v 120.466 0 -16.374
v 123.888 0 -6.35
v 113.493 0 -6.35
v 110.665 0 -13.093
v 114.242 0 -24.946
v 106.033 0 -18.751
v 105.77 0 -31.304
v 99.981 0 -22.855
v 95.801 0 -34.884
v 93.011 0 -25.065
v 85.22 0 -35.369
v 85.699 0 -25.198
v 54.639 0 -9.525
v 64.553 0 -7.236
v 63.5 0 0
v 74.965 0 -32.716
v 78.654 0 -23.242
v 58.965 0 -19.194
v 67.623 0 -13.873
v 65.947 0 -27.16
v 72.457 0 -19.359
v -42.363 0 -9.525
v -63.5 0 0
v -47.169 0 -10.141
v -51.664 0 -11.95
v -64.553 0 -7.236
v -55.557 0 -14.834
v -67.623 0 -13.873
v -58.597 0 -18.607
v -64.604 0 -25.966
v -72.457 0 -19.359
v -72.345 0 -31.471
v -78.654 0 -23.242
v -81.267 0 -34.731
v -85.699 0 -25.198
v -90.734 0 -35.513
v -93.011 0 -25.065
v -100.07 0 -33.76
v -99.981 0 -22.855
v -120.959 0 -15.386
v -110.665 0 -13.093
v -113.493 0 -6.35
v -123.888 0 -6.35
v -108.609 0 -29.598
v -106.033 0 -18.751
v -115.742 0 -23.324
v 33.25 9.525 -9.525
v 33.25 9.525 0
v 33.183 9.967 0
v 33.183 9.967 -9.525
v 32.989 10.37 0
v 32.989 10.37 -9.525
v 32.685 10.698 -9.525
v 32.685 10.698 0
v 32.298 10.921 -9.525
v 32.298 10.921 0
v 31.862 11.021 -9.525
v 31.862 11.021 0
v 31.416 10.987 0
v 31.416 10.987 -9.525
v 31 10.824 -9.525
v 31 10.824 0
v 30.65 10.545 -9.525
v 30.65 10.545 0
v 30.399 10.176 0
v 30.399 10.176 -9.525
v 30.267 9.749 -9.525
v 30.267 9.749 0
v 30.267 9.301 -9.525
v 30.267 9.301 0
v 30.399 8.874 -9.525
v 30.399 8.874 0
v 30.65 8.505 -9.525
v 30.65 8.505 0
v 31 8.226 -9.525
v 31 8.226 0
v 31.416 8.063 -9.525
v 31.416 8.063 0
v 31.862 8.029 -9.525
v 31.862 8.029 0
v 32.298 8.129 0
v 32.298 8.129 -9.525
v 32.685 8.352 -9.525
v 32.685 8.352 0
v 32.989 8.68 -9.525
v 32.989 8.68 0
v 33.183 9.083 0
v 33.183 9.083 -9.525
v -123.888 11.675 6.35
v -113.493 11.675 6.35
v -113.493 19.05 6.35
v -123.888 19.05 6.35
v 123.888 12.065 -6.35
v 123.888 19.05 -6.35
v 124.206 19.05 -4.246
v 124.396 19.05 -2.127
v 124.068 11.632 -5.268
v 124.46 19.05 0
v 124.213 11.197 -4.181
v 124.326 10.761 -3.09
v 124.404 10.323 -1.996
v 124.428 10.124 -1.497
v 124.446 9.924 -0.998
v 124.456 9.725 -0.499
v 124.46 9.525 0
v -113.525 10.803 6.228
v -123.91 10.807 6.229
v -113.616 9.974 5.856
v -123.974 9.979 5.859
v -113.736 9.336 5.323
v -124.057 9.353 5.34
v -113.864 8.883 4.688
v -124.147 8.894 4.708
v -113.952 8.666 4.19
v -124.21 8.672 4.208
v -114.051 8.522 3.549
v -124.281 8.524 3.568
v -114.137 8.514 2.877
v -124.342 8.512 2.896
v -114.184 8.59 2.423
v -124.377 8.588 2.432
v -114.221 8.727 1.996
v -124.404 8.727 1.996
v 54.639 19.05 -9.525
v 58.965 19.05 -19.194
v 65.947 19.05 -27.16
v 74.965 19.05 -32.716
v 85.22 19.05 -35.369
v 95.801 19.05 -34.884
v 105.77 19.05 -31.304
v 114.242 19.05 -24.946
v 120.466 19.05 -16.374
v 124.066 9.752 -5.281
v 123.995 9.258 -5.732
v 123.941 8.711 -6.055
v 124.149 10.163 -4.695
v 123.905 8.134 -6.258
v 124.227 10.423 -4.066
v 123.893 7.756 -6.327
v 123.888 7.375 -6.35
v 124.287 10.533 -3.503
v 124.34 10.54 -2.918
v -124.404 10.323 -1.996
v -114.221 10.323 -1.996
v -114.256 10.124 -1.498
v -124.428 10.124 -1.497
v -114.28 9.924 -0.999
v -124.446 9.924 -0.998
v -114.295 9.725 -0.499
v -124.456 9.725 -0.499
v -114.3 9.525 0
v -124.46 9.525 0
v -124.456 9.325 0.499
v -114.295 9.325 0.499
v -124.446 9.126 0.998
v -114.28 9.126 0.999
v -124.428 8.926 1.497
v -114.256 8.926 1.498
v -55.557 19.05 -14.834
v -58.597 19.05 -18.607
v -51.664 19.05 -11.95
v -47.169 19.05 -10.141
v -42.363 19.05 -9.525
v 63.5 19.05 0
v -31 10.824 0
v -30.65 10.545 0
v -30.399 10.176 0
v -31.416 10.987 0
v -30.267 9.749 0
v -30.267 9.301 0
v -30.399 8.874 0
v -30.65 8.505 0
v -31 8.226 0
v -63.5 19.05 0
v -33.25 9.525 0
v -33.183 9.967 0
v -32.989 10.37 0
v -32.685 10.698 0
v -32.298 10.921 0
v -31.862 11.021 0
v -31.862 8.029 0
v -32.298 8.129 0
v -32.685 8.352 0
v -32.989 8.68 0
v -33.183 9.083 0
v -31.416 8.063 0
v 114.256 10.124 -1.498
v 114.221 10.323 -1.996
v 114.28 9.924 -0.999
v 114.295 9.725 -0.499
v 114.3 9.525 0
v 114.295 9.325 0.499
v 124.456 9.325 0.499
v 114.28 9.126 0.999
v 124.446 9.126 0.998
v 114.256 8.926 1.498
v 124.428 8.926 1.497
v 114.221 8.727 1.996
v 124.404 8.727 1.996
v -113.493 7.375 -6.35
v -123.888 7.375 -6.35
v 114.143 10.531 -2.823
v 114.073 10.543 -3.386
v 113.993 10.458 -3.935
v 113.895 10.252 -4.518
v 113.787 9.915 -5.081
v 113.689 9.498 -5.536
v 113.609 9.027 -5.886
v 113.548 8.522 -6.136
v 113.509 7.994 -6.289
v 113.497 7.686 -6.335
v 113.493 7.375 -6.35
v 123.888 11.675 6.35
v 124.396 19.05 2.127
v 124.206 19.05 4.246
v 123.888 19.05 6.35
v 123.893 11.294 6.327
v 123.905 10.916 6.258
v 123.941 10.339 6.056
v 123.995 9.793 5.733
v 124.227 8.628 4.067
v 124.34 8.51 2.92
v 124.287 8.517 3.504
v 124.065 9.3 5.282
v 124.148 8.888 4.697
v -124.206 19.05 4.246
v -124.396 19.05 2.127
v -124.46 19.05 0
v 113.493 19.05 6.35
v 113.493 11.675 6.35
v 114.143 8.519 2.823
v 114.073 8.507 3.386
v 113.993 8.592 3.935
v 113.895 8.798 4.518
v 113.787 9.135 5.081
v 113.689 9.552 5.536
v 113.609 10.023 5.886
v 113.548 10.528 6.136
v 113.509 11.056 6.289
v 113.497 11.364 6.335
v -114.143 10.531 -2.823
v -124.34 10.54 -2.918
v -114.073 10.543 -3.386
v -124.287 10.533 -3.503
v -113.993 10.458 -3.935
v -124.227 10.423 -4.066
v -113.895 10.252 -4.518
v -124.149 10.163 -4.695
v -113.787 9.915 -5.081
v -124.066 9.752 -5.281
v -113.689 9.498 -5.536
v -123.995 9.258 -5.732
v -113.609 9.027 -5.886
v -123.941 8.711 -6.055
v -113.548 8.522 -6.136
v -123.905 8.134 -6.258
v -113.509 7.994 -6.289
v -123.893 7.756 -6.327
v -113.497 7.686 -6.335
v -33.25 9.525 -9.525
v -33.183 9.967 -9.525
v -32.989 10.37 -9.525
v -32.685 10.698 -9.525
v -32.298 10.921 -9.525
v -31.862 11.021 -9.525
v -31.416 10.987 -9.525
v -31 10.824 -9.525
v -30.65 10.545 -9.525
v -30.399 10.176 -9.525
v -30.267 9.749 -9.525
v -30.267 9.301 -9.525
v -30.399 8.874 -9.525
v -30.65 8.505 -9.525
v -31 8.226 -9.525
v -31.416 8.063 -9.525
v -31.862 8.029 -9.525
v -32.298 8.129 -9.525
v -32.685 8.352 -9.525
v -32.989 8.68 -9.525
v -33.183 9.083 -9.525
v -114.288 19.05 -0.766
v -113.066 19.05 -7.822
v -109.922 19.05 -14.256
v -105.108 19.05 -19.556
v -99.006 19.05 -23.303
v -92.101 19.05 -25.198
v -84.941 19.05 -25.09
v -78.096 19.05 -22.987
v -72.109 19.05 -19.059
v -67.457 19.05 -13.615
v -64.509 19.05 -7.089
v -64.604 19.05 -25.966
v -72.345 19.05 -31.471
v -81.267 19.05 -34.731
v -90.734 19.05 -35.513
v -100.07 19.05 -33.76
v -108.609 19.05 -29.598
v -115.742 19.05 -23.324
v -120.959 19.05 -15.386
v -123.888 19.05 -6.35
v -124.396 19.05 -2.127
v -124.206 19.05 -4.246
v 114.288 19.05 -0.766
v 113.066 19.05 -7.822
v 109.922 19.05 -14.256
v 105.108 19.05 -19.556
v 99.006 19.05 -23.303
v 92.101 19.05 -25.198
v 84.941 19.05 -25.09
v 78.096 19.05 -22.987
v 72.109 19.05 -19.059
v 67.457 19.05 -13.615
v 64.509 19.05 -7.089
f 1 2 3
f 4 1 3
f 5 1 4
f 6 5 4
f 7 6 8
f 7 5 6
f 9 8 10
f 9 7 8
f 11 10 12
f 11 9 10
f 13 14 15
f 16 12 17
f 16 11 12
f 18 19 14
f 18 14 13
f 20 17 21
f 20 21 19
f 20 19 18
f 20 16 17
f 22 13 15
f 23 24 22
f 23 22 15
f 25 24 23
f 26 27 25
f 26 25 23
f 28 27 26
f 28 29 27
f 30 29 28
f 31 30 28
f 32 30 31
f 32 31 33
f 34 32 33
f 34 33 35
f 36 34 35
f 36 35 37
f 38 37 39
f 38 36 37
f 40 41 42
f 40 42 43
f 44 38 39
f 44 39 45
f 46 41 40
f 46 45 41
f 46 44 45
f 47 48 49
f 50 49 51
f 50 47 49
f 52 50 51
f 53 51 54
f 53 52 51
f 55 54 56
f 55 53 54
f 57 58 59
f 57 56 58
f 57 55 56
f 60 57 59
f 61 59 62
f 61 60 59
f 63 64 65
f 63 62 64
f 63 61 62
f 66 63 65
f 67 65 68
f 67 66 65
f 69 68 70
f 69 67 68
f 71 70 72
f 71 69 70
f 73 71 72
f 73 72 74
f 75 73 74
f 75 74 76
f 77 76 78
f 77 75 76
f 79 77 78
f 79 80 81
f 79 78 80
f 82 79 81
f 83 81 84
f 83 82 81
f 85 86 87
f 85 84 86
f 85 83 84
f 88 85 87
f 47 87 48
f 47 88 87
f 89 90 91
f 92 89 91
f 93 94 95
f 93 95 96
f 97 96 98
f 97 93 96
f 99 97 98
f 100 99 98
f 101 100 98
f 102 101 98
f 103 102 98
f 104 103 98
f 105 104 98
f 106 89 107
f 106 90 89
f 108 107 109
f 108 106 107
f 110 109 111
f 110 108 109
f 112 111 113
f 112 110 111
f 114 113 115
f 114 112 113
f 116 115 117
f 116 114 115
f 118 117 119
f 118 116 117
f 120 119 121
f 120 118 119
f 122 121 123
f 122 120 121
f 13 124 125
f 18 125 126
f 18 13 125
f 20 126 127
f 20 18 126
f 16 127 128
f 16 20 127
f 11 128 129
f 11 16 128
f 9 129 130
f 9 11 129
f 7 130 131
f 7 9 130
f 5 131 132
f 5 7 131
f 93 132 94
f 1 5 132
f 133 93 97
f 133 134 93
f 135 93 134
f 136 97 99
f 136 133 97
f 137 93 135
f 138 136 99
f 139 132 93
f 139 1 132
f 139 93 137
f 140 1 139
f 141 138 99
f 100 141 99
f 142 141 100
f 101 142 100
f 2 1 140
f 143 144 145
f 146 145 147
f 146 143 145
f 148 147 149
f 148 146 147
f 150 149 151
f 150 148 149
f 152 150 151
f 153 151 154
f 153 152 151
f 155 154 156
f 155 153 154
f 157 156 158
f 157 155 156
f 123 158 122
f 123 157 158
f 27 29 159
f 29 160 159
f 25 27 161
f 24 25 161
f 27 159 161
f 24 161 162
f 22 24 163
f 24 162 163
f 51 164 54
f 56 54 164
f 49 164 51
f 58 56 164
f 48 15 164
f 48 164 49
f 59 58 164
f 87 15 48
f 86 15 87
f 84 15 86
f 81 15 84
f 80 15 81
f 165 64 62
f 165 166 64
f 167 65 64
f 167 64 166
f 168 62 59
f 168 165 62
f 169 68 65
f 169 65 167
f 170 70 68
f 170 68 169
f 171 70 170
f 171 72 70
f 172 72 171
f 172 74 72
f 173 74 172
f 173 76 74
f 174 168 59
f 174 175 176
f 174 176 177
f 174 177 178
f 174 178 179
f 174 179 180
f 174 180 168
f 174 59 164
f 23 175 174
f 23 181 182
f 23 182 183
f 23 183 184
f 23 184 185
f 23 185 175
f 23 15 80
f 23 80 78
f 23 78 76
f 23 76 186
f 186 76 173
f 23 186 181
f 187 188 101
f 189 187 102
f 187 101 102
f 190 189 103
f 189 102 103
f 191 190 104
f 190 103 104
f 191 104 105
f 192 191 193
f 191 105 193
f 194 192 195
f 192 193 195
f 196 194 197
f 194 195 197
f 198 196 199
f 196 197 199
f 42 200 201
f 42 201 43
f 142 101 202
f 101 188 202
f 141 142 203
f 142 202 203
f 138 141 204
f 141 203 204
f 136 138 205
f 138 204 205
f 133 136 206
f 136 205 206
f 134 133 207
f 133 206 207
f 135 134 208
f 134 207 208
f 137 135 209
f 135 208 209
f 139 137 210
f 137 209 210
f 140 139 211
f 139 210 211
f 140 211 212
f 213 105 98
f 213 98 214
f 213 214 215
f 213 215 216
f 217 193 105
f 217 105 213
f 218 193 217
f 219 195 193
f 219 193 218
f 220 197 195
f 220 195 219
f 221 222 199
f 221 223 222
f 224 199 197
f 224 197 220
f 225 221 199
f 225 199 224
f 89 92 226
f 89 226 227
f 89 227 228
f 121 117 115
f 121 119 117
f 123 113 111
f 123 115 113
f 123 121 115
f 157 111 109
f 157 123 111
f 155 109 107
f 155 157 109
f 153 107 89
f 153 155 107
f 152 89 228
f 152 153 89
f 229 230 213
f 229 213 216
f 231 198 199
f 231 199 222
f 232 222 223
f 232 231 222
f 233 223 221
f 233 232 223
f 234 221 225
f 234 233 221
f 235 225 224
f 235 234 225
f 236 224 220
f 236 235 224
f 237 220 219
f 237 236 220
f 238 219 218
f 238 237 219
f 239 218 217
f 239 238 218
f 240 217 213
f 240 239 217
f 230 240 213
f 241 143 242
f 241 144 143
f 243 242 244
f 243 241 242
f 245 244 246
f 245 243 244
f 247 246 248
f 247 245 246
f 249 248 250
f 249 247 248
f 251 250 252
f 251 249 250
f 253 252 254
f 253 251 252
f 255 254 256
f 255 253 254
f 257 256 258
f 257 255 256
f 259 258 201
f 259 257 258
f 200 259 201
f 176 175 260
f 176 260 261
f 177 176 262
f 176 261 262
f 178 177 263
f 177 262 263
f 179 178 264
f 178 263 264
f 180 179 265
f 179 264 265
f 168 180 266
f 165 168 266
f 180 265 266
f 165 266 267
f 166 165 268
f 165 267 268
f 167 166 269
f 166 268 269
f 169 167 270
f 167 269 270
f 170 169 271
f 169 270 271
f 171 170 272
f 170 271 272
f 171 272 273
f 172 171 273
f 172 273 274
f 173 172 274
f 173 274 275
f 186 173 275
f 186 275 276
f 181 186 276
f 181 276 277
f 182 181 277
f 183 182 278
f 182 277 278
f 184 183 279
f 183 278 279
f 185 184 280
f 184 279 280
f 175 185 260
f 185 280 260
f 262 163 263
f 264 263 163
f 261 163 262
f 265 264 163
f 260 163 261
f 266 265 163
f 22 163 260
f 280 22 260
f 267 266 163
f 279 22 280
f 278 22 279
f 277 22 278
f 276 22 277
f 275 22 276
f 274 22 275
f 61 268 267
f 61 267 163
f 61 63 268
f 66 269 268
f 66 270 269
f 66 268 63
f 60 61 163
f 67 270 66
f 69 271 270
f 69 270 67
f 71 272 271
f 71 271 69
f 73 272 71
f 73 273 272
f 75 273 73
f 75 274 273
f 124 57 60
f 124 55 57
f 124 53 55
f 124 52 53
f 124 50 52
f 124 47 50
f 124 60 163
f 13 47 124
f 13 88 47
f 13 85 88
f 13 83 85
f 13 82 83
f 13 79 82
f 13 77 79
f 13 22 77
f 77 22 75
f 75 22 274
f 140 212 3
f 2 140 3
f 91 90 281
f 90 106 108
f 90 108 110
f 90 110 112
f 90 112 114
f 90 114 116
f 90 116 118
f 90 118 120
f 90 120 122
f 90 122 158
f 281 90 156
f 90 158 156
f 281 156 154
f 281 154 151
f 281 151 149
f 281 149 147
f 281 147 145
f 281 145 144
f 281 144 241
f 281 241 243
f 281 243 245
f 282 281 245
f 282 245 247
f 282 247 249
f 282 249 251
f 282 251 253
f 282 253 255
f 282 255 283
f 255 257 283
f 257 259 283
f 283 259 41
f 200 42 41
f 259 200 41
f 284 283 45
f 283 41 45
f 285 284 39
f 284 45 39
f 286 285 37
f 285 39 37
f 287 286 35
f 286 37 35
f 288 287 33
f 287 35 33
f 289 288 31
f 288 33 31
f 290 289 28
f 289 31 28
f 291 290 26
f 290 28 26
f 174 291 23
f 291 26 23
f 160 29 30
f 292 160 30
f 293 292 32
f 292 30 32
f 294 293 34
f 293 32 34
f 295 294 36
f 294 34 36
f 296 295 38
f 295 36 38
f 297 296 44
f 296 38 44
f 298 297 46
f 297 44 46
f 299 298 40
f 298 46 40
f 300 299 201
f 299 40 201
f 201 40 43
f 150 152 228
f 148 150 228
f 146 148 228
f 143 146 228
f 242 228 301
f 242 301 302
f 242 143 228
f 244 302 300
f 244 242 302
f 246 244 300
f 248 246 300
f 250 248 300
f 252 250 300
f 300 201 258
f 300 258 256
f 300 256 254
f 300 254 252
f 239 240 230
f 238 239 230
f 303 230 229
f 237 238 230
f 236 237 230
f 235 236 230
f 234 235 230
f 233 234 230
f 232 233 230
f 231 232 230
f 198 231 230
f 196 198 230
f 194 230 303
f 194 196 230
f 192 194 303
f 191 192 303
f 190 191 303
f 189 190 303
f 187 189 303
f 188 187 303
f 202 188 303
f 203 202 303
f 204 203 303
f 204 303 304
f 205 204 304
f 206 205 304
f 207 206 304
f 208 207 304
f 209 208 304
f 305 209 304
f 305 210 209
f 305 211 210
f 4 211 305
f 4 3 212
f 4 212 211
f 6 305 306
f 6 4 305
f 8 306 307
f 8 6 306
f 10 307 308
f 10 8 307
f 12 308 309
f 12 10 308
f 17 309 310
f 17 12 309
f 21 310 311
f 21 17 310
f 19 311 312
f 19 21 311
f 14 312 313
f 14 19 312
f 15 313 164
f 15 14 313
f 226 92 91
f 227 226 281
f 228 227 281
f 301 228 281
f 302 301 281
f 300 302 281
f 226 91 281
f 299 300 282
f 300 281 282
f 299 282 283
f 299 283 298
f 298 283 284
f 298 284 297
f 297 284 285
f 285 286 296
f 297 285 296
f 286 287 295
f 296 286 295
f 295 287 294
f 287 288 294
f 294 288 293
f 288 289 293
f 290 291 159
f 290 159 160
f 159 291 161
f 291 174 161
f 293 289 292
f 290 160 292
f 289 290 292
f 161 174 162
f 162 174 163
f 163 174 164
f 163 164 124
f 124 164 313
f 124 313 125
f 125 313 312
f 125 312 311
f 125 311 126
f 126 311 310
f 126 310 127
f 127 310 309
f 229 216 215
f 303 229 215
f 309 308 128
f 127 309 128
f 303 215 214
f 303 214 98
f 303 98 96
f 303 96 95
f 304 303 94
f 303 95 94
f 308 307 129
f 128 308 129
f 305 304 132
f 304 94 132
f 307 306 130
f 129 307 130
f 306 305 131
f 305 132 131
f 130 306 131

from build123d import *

# Parameters (mm, degrees)
BOSS_EXTRUDE1_DEPTH            = 19.05
FILLET1_R                      = 19.05
SKETCH2_R                      = 1.5
CUT_EXTRUDE1_DEPTH             = 129.572996096
BOSS_EXTRUDE2_REACH            = 132.835
BOSS_EXTRUDE2_END_RADIUS       = 25.4
CUT_EXTRUDE3_REACH             = 132.835
CUT_EXTRUDE3_DIRECTION_2_DEPTH = 131.83465787
CUT_EXTRUDE2_DEPTH             = 131.83465787
CUT_EXTRUDE2_DEPTH_BACK        = 131.83465787
FILLET2_R                      = 3.175
FILLET2_OF_MIRROR1_R           = 3.175
CUT_EXTRUDE4_DEPTH             = 131.834658007
CUT_EXTRUDE4_DEPTH_BACK        = 131.834658007


with BuildPart() as part:
    # Sketch1 → Boss-Extrude1 (new body)
    with BuildSketch(Plane(origin=(0, 0, 0), x_dir=(1, 0, 0), z_dir=(0, 1, 0))):
        with BuildLine():
            ThreePointArc((-54.639410761, 9.525), (-93.706612459, 35.233649778), (-124.46, 0))
            Line((-124.46, 0), (-114.3, 0))
            ThreePointArc((-114.3, 0), (-88.9, 25.4), (-63.5, 0))
            Line((-63.5, 0), (-53.34, 0))
            ThreePointArc((-53.34, 0), (-53.666350222, 4.806612459), (-54.639410761, 9.525))
        make_face()
        with BuildLine():
            Line((-53.34, 0), (0, 0))
            Line((0, 0), (0, 9.525))
            Line((0, 9.525), (-54.639410761, 9.525))
            ThreePointArc((-54.639410761, 9.525), (-53.666350222, 4.806612459), (-53.34, 0))
        make_face()
    boss_extrude1 = extrude(amount=BOSS_EXTRUDE1_DEPTH)

    # Fillet1
    fillet1_edges = [part.edges().sort_by_distance(p)[0] for p in [
        (-54.639410761, 9.525, -9.525),
    ]]
    fillet(fillet1_edges, radius=FILLET1_R)

    # Sketch2 → Cut-Extrude1 (cut, symmetric)
    with BuildSketch(Plane(origin=(0, 0, -9.525), x_dir=(-1, 0, 0), z_dir=(0, 0, -1))):
        with Locations((31.75, 9.525)):
            Circle(SKETCH2_R)
    cut_extrude1 = extrude(amount=CUT_EXTRUDE1_DEPTH, both=True, mode=Mode.SUBTRACT)

    # Boss-Extrude2: up to this cylinder (the profile starts outside it)
    boss_extrude2_end = Plane(origin=(-88.9, 11.6227675, 0), z_dir=(0, -1, 0)) * Cylinder(BOSS_EXTRUDE2_END_RADIUS, 323.358869, mode=Mode.PRIVATE)
    # Sketch3 → Boss-Extrude2 (add, up to the surface)
    with BuildSketch(Plane.ZY.offset(124.46), mode=Mode.PRIVATE) as boss_extrude2_sk1:
        Polygon((6.35, 19.05), (-6.35, 19.05), (-6.35, 12.065), (0, 9.525), (6.35, 9.525), align=None)
    boss_extrude2_tool1 = extrude(boss_extrude2_sk1.sketch, amount=-BOSS_EXTRUDE2_REACH, mode=Mode.PRIVATE) - boss_extrude2_end
    # Sketch3 → Boss-Extrude2 (add, up to the surface)
    with BuildSketch(Plane.ZY.offset(124.46), mode=Mode.PRIVATE) as boss_extrude2_sk2:
        Polygon((6.35, 6.985), (6.35, 9.525), (0, 9.525), align=None)
    boss_extrude2_tool2 = extrude(boss_extrude2_sk2.sketch, amount=-BOSS_EXTRUDE2_REACH, mode=Mode.PRIVATE) - boss_extrude2_end
    boss_extrude2 = boss_extrude2_tool1.solids().sort_by_distance((-124.46, 14.567202, 0.302381))[0] + boss_extrude2_tool2.solids().sort_by_distance((-124.46, 8.678333, 4.233333))[0]
    add(boss_extrude2)

    # Sketch3<3> → Cut-Extrude3 (cut, up to next)
    with BuildSketch(Plane.ZY.offset(124.46), mode=Mode.PRIVATE) as cut_extrude3_sk1:
        Polygon((-6.35, 0), (6.35, 0), (6.35, 6.985), (-6.35, 12.065), align=None)
    cut_extrude3_tool1 = extrude(cut_extrude3_sk1.sketch, amount=-CUT_EXTRUDE3_REACH, mode=Mode.PRIVATE) & part.part
    cut_extrude3 = cut_extrude3_tool1.solids().sort_by_distance((-124.46, 4.875389, -0.564444))[0]
    add(cut_extrude3, mode=Mode.SUBTRACT)

    # Sketch3<3> → Cut-Extrude3 direction 2 (cut)
    with BuildSketch(Plane.ZY.offset(124.46)):
        Polygon((-6.35, 0), (6.35, 0), (6.35, 6.985), (-6.35, 12.065), align=None)
    cut_extrude3_direction_2 = extrude(amount=CUT_EXTRUDE3_DIRECTION_2_DEPTH, mode=Mode.SUBTRACT)

    # Sketch4 → Cut-Extrude2 (cut, two sides: drawn at the far end of the back side and taken through both)
    with BuildSketch(Plane(origin=(0, 19.05, 0), x_dir=(1, 0, 0), z_dir=(0, 1, 0)).offset(-CUT_EXTRUDE2_DEPTH_BACK)):
        with BuildLine():
            Line((-124.46, -6.35), (-123.888442377, -6.35))
            ThreePointArc((-123.888442377, -6.35), (-124.316822351, -3.187835399), (-124.46, -2e-09))
            Line((-124.46, -2e-09), (-124.46, -6.35))
        make_face()
        with BuildLine():
            ThreePointArc((-124.46, -2e-09), (-124.316822351, 3.187835398), (-123.888442377, 6.35))
            Line((-123.888442377, 6.35), (-124.46, 6.35))
            Line((-124.46, 6.35), (-124.46, -2e-09))
        make_face()
    extrude(amount=CUT_EXTRUDE2_DEPTH + CUT_EXTRUDE2_DEPTH_BACK, mode=Mode.SUBTRACT)

    # Fillet2
    fillet2_edges = [part.edges().sort_by_distance(p)[0] for p in [
        (-118.690943313, 6.985, 6.35),
        (-118.690943313, 12.065, -6.35),
    ]]
    fillet(fillet2_edges, radius=FILLET2_R)

    # Mirror1: Boss-Extrude1, Cut-Extrude1, Boss-Extrude2, Cut-Extrude3, Cut-Extrude3 direction 2 across plane
    add(boss_extrude1.mirror(Plane(origin=(0, 19.05, 0), x_dir=(0, 0, 1), z_dir=(1, 0, 0))))
    add(cut_extrude1.mirror(Plane(origin=(0, 19.05, 0), x_dir=(0, 0, 1), z_dir=(1, 0, 0))), mode=Mode.SUBTRACT)
    add(boss_extrude2.mirror(Plane(origin=(0, 19.05, 0), x_dir=(0, 0, 1), z_dir=(1, 0, 0))))
    add(cut_extrude3.mirror(Plane(origin=(0, 19.05, 0), x_dir=(0, 0, 1), z_dir=(1, 0, 0))), mode=Mode.SUBTRACT)
    add(cut_extrude3_direction_2.mirror(Plane(origin=(0, 19.05, 0), x_dir=(0, 0, 1), z_dir=(1, 0, 0))), mode=Mode.SUBTRACT)

    # Fillet2 of Mirror1
    fillet2_of_mirror1_edges = [part.edges().sort_by_distance(p)[0] for p in [
        (118.690943313, 6.985, 6.35),
        (118.690943313, 12.065, -6.35),
    ]]
    fillet(fillet2_of_mirror1_edges, radius=FILLET2_OF_MIRROR1_R)

    # Sketch5 → Cut-Extrude4 (cut, two sides: drawn at the far end of the back side and taken through both)
    with BuildSketch(Plane(origin=(0, 19.05, 0), x_dir=(1, 0, 0), z_dir=(0, 1, 0)).offset(-CUT_EXTRUDE4_DEPTH_BACK)):
        with BuildLine():
            ThreePointArc((123.888442377, 6.35), (124.316822351, 3.187835399), (124.46, 0))
            Line((124.46, 0), (124.46, 6.35))
            Line((124.46, 6.35), (123.888442377, 6.35))
        make_face()
        with BuildLine():
            Line((124.46, -6.35), (124.46, 0))
            ThreePointArc((124.46, 0), (124.316822351, -3.187835399), (123.888442377, -6.35))
            Line((123.888442377, -6.35), (124.46, -6.35))
        make_face()
    extrude(amount=CUT_EXTRUDE4_DEPTH + CUT_EXTRUDE4_DEPTH_BACK, mode=Mode.SUBTRACT)


solid = part.part
